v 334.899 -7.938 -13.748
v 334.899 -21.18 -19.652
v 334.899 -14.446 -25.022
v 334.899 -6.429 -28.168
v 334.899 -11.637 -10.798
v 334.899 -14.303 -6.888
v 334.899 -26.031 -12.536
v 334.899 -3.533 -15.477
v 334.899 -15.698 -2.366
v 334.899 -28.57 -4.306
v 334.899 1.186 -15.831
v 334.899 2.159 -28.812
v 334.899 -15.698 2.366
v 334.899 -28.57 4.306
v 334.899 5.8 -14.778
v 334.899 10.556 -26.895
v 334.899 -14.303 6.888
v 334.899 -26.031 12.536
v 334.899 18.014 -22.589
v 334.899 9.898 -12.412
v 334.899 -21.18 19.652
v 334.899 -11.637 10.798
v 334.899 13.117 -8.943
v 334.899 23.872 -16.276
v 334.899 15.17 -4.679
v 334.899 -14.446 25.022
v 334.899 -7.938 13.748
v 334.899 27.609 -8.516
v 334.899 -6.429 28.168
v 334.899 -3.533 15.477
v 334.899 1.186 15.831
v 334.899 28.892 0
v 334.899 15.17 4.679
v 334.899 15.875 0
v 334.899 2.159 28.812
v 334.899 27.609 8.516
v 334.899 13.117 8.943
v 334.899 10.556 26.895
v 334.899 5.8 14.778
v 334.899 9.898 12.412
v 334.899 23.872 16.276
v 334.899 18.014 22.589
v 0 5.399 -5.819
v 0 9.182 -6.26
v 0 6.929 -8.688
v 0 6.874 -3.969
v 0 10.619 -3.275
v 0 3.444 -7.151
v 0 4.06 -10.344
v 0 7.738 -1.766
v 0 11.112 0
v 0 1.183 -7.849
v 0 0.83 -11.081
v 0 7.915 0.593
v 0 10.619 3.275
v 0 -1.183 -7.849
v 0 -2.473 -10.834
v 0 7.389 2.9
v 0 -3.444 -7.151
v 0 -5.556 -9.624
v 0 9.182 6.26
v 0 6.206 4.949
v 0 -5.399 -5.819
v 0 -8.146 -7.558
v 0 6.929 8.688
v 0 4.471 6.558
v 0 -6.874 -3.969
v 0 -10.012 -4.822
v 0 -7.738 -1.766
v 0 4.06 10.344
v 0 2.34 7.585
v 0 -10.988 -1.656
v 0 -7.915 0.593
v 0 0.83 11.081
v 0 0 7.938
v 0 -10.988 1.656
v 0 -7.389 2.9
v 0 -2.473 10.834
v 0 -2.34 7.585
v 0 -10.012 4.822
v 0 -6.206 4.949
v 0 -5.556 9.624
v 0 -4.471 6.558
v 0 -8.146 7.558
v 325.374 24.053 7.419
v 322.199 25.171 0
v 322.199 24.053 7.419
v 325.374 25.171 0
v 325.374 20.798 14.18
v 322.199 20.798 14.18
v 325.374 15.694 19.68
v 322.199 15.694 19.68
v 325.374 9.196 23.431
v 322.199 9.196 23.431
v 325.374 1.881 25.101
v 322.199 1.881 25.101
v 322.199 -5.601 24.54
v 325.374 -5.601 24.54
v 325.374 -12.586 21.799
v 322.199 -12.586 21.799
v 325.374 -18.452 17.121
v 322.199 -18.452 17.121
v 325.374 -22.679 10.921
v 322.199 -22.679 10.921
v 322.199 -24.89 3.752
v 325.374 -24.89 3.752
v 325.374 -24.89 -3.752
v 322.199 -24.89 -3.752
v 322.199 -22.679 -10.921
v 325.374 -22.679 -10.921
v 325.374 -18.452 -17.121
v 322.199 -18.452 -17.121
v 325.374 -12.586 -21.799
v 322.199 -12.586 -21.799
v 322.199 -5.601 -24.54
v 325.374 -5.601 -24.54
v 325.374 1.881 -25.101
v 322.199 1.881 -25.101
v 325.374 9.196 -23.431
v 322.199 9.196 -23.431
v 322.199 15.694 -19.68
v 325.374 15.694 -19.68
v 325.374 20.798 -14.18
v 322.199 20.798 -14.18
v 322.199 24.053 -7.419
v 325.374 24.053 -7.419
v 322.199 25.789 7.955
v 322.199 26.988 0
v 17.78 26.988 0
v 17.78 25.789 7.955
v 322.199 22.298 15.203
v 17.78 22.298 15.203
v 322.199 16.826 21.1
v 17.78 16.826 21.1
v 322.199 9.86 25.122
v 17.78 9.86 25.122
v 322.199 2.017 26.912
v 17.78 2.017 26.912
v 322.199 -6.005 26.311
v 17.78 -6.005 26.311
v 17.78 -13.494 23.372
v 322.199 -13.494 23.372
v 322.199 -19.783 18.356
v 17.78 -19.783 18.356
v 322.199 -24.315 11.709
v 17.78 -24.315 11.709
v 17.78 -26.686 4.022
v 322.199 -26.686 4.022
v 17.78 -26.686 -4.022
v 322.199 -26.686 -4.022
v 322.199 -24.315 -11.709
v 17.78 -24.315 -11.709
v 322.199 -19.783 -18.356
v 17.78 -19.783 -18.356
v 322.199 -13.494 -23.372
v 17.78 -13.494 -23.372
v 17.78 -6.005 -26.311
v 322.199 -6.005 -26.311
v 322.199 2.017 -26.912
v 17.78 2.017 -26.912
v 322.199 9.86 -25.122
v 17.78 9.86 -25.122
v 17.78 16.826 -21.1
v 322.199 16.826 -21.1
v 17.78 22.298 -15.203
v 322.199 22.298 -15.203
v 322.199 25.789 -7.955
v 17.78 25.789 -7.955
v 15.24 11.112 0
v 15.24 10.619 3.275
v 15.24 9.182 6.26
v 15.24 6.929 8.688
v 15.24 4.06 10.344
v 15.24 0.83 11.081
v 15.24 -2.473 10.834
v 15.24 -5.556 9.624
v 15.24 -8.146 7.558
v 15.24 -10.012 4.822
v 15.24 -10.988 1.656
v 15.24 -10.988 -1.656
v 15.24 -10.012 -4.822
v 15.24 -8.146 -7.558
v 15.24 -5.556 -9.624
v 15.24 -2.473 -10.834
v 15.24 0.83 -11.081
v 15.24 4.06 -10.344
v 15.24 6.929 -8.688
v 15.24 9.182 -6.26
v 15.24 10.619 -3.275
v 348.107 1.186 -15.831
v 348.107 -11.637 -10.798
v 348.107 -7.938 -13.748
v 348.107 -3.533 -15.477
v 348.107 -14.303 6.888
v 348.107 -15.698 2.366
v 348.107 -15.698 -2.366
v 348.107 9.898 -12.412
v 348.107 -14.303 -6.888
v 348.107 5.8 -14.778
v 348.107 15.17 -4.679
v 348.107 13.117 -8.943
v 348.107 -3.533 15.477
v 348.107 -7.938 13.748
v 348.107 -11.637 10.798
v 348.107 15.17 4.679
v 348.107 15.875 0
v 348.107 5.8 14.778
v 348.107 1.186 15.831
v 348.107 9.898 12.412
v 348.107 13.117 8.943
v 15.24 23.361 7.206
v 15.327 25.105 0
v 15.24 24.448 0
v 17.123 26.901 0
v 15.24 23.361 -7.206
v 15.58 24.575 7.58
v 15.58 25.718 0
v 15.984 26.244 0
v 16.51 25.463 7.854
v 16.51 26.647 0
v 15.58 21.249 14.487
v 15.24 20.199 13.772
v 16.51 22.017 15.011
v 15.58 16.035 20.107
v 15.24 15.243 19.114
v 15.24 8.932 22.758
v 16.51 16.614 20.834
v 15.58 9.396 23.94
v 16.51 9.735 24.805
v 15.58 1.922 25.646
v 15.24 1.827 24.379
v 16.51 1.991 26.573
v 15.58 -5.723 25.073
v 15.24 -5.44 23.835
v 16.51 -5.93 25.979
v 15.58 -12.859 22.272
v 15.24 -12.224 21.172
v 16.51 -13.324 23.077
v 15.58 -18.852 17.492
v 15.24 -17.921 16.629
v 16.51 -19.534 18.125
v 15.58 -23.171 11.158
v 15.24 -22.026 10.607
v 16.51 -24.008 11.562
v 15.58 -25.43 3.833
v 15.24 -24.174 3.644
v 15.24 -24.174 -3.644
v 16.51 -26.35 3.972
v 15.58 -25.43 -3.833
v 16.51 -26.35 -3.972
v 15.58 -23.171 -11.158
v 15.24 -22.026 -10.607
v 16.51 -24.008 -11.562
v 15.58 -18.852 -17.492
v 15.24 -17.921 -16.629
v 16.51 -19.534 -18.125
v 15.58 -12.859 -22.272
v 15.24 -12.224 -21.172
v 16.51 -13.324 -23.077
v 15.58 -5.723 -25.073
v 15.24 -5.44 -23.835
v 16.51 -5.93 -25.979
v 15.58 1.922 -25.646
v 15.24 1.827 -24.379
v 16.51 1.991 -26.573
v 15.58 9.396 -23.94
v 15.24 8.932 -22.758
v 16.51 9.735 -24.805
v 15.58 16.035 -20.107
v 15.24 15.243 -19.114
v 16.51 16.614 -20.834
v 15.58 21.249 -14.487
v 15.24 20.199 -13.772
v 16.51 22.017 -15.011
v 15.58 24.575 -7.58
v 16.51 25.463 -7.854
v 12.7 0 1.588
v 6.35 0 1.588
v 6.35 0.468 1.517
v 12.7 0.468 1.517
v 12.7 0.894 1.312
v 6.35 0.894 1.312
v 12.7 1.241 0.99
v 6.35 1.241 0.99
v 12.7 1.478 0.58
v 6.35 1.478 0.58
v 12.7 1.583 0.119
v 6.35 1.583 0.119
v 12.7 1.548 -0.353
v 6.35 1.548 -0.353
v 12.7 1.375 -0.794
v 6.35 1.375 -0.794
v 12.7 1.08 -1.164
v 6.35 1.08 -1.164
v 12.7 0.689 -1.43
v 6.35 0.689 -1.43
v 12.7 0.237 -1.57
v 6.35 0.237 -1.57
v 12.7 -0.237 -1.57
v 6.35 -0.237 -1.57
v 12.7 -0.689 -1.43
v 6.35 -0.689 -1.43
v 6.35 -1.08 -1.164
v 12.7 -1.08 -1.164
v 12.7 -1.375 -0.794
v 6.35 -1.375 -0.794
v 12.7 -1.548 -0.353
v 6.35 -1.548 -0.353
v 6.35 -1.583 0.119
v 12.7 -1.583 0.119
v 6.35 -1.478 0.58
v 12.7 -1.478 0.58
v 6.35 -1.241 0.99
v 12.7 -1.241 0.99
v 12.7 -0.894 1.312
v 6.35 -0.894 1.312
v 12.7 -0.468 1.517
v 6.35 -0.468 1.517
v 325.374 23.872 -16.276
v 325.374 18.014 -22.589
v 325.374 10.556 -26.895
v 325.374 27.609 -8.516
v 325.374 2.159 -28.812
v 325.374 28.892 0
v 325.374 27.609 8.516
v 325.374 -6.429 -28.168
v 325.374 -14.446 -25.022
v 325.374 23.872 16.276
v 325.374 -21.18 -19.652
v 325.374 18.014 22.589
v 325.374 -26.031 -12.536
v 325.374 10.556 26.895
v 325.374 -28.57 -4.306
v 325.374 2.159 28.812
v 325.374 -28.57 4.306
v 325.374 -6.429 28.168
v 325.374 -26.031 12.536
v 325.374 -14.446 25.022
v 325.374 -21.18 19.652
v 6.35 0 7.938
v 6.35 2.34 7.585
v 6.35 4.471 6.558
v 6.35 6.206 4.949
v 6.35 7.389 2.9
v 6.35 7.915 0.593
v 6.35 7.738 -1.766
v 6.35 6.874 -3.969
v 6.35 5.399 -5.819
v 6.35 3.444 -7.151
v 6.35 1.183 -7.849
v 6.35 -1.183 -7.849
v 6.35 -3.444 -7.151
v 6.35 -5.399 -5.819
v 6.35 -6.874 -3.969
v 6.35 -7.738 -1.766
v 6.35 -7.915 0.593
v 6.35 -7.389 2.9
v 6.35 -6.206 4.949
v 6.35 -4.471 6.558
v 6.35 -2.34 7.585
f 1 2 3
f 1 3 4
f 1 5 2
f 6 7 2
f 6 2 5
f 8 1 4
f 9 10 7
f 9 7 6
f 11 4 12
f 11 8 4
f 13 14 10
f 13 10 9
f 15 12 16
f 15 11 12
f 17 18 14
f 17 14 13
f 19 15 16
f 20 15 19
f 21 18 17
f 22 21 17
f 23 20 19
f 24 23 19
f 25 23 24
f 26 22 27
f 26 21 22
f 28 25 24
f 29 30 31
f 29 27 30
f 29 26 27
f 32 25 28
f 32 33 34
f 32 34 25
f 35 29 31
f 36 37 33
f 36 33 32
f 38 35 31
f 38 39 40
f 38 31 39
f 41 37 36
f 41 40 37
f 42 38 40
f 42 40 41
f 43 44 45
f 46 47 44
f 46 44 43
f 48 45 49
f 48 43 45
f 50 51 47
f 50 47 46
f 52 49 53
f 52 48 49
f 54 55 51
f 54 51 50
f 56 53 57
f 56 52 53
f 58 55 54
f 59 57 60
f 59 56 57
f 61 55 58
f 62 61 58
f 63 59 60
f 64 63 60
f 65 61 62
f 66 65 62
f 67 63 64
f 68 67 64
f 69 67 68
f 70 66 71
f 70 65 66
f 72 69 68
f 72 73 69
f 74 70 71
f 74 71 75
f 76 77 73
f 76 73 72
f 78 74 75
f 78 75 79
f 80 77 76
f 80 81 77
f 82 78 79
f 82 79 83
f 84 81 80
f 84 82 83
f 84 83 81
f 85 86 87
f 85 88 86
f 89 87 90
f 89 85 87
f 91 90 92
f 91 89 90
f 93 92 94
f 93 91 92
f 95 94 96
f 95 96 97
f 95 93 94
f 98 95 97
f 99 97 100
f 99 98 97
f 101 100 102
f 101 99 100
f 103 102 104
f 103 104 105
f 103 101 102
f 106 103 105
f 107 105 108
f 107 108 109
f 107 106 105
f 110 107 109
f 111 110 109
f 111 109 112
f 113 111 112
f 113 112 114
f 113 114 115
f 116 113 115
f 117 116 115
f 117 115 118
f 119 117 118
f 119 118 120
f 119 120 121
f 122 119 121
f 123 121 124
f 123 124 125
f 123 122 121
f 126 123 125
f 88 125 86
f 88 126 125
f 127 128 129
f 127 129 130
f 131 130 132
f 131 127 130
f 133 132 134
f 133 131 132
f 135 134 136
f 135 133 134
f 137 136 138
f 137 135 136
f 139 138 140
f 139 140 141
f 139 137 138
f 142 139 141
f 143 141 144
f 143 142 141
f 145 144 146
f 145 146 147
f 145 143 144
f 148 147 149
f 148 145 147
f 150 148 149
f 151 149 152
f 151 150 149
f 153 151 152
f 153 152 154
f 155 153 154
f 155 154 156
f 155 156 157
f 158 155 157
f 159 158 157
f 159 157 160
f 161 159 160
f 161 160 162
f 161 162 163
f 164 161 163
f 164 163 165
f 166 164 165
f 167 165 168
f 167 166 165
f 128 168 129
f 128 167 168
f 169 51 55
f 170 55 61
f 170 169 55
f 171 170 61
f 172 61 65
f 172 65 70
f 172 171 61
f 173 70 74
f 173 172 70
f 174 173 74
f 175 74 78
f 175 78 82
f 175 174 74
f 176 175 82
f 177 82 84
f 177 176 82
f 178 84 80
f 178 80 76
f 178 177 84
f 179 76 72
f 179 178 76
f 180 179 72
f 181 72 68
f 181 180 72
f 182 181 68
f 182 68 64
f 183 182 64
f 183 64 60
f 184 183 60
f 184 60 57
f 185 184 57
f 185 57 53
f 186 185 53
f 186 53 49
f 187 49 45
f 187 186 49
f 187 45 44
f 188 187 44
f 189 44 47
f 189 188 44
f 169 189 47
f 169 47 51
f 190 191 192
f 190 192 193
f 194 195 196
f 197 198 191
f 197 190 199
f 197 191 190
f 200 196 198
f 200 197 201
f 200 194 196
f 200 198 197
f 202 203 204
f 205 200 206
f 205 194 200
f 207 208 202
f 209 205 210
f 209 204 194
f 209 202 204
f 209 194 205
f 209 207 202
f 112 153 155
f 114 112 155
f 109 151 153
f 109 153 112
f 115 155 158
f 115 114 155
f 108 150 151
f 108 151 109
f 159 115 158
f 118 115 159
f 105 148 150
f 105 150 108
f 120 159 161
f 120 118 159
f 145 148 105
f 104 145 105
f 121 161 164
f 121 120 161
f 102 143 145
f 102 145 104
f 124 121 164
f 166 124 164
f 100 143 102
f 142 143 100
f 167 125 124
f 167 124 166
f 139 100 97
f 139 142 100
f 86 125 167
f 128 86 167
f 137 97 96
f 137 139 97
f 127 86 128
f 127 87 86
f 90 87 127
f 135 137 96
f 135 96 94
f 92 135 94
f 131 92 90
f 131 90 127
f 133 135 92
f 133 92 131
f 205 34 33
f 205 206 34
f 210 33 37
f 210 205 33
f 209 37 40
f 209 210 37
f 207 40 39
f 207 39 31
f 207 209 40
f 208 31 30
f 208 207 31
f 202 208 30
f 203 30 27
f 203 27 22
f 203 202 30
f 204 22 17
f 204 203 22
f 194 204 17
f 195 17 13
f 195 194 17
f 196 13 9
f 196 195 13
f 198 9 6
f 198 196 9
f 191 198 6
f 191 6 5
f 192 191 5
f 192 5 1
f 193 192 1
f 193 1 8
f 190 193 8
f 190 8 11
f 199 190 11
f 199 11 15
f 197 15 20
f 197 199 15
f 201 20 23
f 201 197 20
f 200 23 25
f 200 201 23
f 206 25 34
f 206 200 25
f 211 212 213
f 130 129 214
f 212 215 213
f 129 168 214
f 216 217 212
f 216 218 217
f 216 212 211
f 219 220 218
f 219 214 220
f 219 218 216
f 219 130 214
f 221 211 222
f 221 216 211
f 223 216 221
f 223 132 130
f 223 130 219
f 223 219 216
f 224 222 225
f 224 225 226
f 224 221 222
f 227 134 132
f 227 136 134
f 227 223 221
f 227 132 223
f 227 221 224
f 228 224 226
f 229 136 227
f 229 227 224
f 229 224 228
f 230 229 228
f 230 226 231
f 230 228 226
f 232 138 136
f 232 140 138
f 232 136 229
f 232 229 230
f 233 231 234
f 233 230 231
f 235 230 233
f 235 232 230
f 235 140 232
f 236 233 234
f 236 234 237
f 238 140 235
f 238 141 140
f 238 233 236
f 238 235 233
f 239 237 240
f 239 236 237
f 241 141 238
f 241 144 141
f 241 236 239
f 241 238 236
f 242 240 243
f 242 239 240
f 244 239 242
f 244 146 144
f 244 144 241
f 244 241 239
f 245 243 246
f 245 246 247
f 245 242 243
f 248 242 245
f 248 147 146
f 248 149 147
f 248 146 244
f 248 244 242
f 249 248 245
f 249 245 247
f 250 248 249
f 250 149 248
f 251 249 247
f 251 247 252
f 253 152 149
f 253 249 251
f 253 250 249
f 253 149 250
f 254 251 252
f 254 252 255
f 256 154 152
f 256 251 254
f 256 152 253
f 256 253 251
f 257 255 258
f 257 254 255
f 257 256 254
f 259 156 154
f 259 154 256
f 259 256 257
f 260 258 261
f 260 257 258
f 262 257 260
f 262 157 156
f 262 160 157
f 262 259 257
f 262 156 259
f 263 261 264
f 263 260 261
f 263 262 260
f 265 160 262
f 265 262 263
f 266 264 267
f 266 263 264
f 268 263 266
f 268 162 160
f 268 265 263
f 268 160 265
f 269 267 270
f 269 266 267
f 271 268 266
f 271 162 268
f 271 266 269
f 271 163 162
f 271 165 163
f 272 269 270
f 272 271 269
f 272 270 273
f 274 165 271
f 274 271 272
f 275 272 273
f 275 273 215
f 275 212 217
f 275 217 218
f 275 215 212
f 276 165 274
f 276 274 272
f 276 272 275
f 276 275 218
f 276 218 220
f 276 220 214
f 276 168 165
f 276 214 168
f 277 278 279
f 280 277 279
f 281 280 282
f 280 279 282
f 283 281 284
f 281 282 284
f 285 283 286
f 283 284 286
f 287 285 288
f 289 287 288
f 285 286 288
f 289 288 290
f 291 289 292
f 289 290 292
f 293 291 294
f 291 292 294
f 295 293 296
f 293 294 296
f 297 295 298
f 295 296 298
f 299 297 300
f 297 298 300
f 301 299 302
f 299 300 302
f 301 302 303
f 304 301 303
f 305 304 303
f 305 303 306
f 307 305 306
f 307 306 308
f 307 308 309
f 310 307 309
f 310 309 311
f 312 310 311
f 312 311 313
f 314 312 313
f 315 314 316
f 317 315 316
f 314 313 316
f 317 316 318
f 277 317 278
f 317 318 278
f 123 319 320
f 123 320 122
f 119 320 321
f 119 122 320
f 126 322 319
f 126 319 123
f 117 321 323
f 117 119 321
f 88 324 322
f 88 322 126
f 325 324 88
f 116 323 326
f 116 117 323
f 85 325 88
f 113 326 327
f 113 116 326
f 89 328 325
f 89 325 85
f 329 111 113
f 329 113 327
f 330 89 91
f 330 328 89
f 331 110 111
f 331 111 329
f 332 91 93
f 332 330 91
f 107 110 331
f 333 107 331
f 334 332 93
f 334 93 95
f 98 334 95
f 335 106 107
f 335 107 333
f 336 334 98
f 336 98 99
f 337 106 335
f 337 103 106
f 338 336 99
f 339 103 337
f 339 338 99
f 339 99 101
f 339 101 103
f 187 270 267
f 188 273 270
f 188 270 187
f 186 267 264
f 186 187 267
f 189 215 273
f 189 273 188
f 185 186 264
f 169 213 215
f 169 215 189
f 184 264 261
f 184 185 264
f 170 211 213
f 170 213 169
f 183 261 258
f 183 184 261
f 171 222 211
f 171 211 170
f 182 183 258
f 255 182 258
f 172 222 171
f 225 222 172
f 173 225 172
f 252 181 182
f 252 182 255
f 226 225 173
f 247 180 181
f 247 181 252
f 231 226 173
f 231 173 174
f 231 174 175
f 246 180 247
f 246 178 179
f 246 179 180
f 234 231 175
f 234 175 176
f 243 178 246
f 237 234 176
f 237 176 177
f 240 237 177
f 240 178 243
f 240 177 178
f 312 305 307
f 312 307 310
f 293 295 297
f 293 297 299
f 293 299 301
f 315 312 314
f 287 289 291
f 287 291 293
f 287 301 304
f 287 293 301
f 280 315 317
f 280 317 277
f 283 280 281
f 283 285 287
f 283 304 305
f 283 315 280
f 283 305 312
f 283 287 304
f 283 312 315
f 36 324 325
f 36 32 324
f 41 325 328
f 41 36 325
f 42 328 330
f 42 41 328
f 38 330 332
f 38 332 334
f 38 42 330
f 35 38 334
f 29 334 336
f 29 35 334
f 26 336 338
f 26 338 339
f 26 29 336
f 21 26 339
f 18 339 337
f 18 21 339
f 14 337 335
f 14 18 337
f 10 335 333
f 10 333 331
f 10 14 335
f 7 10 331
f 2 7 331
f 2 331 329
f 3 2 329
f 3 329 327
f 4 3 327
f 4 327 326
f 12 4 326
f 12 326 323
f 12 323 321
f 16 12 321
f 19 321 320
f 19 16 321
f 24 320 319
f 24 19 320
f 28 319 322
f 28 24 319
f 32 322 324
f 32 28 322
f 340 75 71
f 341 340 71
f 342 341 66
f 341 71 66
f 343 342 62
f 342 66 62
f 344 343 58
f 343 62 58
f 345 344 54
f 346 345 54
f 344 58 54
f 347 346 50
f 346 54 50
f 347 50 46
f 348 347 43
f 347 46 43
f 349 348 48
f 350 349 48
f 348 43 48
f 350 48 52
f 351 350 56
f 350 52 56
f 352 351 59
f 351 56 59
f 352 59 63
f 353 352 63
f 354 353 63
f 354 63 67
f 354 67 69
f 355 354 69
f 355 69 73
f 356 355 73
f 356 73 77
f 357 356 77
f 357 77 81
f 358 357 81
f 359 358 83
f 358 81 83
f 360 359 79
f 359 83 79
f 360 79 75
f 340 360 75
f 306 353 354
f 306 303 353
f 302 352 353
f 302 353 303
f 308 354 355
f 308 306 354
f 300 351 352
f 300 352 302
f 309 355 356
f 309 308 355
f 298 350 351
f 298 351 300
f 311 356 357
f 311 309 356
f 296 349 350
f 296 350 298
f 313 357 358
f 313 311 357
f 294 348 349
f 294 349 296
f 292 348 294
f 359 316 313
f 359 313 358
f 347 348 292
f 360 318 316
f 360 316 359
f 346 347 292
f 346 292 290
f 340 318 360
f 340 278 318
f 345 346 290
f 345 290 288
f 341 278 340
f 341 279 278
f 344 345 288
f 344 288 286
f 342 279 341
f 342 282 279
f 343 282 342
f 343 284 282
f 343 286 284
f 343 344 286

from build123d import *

# Parameters (mm, degrees)
FILLET1_R          = 2.54
SKETCH2_R          = 7.9375
CUT_EXTRUDE1_DEPTH = 6.35
SKETCH3_R          = 1.5875
CUT_EXTRUDE2_DEPTH = 6.35


with BuildPart() as part:
    # Sketch1 → Revolve1 (revolve)
    with BuildSketch(Plane.XY):
        Polygon((0, 0), (0, 11.1125), (15.24, 11.1125), (15.24, 26.9875), (322.199, 26.9875), (322.199, 25.1714), (325.374, 25.1714), (325.374, 28.8925), (334.899, 28.8925), (334.899, 15.875), (348.107, 15.875), (348.107, 0), align=None)
    revolve(axis=Axis((0, 0, 0), (1, 0, 0)))

    # Fillet1
    fillet1_edges = [part.edges().sort_by_distance(p)[0] for p in [
        (15.24, -26.9875, 0),
    ]]
    fillet(fillet1_edges, radius=FILLET1_R)

    # Sketch2 → Cut-Extrude1 (cut)
    with BuildSketch(Plane.ZY):
        Circle(SKETCH2_R)
    extrude(amount=-CUT_EXTRUDE1_DEPTH, mode=Mode.SUBTRACT)

    # Sketch3 → Cut-Extrude2 (cut)
    with BuildSketch(Plane.ZY.offset(-6.35)):
        Circle(SKETCH3_R)
    extrude(amount=-CUT_EXTRUDE2_DEPTH, mode=Mode.SUBTRACT)


solid = part.part
